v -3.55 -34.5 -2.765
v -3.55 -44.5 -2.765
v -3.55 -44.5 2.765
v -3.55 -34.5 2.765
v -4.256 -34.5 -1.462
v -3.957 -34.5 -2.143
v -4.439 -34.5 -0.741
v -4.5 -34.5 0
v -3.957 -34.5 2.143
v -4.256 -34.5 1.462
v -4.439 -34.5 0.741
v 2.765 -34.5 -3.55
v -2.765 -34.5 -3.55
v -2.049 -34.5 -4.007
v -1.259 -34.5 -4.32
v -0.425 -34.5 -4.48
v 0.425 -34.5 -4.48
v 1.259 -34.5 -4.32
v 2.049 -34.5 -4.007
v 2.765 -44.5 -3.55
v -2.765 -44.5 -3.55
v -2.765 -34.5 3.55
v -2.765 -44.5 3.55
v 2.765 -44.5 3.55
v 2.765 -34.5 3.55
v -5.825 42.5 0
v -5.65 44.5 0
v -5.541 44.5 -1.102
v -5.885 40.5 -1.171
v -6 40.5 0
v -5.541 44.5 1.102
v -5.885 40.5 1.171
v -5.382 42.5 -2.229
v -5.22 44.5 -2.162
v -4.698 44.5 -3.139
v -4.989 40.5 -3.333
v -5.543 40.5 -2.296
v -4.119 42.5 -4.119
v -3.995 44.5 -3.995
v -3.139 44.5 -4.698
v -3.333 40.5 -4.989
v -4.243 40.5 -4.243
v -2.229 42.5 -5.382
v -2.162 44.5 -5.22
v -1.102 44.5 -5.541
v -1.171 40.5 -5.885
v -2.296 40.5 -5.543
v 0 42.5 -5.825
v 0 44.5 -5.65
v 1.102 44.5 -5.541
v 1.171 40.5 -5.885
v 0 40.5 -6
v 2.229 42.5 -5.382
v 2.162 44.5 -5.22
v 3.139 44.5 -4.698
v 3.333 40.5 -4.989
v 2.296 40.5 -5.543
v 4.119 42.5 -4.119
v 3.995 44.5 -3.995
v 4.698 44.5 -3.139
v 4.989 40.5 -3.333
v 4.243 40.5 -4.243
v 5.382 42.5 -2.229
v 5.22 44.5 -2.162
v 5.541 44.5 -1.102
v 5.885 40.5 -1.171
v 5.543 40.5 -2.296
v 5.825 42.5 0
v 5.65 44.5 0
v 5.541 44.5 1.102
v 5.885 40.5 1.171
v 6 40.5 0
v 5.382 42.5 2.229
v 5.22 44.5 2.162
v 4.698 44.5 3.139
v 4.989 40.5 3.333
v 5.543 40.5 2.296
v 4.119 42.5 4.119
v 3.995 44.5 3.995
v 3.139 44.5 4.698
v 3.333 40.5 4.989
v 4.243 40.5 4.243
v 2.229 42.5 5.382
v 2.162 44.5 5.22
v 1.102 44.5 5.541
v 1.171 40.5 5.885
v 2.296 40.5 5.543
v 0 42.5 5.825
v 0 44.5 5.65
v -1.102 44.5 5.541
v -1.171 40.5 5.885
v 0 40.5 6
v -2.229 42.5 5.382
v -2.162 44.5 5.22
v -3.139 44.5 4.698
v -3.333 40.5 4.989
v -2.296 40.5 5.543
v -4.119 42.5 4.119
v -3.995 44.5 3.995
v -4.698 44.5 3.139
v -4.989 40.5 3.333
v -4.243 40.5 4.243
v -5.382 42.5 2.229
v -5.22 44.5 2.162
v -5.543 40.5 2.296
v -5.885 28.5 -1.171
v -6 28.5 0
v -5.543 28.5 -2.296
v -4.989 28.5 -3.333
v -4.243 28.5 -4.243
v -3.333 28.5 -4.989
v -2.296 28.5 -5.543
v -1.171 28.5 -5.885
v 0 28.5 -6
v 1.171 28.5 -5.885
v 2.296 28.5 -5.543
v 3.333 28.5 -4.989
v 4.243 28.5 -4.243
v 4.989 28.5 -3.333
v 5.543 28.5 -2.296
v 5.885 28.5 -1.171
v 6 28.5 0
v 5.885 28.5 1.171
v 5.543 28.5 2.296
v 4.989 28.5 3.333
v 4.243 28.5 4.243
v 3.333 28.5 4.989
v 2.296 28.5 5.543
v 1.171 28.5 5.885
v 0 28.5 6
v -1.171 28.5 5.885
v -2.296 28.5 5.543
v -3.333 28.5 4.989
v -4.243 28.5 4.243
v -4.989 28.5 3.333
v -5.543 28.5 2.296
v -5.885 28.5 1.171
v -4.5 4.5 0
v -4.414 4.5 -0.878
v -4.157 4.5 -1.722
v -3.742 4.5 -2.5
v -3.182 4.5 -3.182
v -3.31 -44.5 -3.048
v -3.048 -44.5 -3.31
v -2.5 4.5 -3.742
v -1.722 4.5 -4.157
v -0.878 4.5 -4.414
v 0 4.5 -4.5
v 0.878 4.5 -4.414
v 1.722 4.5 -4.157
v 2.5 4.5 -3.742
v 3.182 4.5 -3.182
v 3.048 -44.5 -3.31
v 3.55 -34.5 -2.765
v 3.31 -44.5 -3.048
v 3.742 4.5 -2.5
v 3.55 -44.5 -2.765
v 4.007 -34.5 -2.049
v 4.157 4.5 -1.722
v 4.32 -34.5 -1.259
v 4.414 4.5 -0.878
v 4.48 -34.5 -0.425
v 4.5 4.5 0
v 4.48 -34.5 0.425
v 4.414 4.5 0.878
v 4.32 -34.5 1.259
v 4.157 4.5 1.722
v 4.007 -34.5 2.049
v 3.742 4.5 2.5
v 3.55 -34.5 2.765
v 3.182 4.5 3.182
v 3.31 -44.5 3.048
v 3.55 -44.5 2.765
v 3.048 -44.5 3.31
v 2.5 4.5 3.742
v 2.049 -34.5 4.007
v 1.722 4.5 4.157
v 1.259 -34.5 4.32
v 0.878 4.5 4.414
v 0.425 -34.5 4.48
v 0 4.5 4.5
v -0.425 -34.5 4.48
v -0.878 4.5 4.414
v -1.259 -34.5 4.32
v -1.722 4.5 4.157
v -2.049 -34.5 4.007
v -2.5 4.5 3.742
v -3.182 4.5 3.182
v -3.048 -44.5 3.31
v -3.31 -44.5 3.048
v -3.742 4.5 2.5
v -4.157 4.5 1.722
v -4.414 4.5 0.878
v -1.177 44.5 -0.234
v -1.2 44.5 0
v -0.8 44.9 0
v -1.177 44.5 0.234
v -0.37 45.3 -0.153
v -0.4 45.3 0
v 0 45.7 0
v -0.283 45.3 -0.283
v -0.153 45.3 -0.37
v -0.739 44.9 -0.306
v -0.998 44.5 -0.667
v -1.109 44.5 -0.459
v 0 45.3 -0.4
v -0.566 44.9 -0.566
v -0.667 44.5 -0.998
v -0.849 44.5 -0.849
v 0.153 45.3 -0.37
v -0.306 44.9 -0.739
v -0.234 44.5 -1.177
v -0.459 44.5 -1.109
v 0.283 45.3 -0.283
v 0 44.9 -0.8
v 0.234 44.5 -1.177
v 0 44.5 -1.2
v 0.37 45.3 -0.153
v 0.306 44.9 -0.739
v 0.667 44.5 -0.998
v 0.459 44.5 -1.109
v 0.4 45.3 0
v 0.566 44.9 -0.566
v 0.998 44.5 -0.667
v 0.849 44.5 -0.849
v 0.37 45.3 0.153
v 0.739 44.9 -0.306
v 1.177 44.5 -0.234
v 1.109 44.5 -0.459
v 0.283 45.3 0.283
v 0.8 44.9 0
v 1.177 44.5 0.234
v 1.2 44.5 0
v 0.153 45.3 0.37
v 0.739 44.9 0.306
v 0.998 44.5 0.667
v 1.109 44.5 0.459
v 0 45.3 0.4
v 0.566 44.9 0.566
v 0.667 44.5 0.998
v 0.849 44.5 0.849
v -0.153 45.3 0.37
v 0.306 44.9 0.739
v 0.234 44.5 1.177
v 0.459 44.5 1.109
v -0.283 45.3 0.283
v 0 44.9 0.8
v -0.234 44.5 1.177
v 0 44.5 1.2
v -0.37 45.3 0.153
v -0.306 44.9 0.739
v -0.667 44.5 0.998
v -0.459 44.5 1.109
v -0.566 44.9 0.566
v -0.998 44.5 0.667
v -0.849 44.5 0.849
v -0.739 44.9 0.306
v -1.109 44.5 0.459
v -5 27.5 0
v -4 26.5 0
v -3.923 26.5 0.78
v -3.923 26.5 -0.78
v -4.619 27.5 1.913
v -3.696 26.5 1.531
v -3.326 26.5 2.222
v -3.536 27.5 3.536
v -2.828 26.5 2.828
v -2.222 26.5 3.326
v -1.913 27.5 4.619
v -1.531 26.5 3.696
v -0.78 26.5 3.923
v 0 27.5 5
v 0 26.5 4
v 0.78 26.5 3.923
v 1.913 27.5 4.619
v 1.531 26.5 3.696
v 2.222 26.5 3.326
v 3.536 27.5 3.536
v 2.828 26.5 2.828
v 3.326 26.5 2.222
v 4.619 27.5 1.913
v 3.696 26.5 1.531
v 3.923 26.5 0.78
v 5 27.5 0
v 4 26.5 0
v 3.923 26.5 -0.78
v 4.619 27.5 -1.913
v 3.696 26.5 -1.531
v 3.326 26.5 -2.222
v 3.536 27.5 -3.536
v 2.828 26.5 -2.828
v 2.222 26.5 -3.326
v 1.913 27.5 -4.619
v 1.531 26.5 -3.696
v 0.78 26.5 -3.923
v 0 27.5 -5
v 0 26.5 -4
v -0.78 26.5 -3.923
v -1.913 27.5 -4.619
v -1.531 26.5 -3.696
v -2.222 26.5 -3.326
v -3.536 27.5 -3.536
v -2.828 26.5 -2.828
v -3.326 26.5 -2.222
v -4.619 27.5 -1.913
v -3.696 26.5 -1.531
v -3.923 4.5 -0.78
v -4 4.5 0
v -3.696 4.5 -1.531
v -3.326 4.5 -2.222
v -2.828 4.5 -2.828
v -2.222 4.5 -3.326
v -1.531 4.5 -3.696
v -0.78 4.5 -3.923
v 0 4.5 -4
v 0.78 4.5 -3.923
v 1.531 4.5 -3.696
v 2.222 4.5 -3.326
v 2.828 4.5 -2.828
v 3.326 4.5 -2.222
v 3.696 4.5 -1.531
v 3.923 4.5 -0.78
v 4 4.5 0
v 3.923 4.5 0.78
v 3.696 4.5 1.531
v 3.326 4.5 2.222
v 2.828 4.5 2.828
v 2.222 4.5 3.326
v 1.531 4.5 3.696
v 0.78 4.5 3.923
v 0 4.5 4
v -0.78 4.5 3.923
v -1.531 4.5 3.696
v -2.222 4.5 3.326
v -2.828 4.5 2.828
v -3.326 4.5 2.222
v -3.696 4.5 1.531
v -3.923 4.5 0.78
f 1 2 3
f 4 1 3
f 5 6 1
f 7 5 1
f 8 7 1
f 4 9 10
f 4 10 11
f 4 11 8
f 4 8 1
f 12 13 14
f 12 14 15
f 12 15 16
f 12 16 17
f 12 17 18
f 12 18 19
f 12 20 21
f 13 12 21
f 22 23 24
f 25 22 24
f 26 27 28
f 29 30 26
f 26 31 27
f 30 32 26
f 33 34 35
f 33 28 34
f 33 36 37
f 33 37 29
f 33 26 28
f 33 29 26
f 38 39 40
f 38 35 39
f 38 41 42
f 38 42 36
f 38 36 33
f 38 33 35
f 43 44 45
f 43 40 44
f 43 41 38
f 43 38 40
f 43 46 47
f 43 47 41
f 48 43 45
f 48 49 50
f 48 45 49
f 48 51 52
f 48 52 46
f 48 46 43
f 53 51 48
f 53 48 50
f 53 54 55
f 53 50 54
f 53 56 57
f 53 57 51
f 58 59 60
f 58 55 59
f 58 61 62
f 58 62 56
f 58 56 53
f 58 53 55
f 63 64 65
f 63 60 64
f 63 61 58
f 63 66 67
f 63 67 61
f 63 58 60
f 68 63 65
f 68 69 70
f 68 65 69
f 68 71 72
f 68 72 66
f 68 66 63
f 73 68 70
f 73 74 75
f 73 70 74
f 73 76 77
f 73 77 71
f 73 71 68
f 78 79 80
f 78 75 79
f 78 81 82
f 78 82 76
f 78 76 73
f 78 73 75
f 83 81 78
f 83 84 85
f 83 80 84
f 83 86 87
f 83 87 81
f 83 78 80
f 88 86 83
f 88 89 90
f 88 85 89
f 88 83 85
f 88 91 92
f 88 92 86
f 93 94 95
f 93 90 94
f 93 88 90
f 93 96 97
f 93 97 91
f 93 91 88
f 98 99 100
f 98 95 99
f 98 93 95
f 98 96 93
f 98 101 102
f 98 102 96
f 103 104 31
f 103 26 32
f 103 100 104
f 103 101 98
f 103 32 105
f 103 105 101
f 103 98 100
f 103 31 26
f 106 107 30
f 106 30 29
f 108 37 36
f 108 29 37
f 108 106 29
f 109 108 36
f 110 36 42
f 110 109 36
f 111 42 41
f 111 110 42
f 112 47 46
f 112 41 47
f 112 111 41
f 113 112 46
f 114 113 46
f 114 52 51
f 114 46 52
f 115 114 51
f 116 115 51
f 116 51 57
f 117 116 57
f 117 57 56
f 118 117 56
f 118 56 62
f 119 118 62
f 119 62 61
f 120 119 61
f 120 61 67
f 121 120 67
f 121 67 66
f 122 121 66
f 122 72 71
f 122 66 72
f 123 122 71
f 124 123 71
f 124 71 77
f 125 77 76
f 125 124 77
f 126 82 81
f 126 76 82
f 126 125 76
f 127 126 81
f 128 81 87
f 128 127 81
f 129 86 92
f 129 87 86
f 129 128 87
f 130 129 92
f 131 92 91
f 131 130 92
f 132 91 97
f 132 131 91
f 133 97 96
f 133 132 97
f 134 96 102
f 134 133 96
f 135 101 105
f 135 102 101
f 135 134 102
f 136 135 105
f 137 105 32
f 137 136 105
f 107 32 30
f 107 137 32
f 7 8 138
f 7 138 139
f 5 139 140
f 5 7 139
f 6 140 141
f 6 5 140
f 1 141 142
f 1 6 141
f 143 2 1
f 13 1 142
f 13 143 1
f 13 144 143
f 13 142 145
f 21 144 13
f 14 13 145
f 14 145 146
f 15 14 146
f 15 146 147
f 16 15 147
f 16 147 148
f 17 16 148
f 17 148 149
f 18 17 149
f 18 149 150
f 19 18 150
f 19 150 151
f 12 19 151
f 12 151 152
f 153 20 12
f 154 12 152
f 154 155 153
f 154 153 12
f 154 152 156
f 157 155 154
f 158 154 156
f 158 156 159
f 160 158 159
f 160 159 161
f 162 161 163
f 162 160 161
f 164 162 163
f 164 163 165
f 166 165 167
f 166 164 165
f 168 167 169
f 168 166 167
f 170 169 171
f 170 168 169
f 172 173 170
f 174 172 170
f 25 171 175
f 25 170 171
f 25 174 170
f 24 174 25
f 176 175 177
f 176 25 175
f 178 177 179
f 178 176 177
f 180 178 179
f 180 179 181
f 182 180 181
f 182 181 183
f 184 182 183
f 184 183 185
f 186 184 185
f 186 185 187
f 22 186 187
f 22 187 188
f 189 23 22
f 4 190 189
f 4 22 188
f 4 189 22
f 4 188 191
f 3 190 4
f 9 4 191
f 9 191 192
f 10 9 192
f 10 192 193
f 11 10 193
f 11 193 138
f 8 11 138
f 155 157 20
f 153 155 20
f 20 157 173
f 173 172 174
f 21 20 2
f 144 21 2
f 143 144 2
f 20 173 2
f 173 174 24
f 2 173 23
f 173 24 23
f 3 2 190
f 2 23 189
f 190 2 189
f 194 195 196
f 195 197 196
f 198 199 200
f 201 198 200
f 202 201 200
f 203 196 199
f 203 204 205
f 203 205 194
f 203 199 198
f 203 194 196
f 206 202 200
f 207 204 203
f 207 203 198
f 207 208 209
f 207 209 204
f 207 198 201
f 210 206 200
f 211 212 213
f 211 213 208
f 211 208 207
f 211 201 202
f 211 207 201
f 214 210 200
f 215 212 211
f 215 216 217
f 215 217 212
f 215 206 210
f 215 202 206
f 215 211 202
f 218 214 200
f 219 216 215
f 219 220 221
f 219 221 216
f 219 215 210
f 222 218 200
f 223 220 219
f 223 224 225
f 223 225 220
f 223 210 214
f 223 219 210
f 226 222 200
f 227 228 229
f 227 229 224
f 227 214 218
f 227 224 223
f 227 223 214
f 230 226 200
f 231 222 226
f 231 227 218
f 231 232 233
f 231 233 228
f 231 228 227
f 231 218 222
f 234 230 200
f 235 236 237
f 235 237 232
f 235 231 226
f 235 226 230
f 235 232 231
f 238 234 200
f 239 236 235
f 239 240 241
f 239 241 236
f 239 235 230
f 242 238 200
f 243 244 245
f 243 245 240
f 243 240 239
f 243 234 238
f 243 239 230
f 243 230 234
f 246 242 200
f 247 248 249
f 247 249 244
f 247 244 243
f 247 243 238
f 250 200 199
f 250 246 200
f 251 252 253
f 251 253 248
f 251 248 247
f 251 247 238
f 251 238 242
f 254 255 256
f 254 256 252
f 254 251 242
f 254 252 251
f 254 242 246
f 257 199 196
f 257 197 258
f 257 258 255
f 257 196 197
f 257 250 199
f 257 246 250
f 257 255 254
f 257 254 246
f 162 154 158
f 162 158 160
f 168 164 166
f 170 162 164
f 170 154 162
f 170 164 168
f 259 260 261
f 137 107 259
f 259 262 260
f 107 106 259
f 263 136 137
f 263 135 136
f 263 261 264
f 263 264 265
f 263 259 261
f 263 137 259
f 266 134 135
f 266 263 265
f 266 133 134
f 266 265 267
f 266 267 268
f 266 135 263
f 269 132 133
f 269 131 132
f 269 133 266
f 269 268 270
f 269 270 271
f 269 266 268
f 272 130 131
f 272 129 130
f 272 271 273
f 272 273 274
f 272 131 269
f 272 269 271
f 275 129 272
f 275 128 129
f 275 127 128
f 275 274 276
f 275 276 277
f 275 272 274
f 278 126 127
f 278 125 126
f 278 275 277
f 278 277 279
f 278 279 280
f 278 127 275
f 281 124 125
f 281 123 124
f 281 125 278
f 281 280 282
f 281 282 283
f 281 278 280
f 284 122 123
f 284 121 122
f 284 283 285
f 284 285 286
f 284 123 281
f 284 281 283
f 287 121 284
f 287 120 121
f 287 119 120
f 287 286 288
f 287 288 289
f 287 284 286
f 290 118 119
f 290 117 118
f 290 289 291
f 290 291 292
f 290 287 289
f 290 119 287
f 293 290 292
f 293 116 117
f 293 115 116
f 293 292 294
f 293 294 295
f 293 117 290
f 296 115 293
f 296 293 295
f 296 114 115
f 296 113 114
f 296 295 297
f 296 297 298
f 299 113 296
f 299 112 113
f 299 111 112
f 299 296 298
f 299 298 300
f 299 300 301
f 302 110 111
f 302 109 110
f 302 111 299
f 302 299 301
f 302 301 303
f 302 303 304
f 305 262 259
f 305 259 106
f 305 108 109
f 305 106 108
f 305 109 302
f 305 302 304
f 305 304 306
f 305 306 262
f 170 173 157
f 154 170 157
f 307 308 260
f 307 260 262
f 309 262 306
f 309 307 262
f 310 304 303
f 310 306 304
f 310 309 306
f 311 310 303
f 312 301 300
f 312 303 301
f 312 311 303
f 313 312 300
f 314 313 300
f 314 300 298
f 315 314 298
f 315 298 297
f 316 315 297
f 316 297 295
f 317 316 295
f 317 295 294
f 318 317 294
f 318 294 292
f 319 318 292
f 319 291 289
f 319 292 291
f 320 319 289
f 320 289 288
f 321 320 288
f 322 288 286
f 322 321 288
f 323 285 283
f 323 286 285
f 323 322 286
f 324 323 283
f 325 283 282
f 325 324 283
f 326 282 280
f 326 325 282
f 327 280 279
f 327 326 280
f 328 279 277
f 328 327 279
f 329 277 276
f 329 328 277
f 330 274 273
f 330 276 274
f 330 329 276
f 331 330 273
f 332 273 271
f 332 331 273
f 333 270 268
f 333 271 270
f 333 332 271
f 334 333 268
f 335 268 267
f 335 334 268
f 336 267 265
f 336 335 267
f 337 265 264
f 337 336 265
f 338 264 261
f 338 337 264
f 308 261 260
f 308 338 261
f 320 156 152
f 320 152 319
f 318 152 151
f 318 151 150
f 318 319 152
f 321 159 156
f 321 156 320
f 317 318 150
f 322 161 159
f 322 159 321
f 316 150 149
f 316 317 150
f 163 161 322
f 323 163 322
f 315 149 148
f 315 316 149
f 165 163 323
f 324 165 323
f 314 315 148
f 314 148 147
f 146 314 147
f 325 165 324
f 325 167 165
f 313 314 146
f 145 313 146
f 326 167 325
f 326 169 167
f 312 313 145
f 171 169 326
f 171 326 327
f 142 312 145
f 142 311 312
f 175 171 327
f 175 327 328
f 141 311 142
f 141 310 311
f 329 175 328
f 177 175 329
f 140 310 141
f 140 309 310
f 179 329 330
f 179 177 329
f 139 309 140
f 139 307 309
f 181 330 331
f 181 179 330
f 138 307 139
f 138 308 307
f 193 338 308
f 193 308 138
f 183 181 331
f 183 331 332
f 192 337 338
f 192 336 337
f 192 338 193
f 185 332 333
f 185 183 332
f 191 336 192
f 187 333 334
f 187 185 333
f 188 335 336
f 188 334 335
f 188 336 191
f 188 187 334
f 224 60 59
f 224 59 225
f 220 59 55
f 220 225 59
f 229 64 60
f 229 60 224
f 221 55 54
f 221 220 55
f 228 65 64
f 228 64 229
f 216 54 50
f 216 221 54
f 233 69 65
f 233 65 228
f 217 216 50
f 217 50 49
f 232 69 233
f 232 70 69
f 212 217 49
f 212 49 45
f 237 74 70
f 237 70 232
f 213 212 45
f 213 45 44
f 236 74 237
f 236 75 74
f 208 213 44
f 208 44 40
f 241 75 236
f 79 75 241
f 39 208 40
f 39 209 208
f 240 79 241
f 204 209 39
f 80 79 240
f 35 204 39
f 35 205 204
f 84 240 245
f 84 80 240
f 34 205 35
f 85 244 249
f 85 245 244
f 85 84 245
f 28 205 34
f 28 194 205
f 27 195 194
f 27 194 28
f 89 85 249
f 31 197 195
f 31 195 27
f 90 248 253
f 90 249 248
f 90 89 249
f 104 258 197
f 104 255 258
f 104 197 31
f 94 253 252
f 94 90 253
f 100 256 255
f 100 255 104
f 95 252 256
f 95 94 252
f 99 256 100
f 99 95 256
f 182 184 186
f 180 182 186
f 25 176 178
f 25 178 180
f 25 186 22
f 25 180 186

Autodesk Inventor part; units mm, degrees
ref_plane "YZ Plane" through (0, 0, 0) normal (1, 0, 0) x (0, 1, 0)
ref_plane "XZ Plane" through (0, 0, 0) normal (0, 1, 0) x (-1, 0, 0)
ref_plane "XY Plane" through (0, 0, 0) normal (0, 0, 1) x (1, 0, 0)
sketch "Sketch1" plane through (0, 0, 0) normal (0, 0, 1) x (1, 0, 0)
  line L0 (-7.2, 0) -> (1.2, 0) construction
  line L1 (0, -62.54) -> (0, 63.74) projected
  line L2 (0, 45.7) -> (-1.2, 44.5)
  line L3 (-1.2, 44.5) -> (-5.65, 44.5)
  line L4 (-5.65, 44.5) -> (-6, 40.5)
  line L5 (-6, 40.5) -> (-6, 28.5)
  line L6 (-4, 26.5) -> (-4, 4.5)
  line L7 (-4, 4.5) -> (-4.5, 4.5)
  line L8 (-4.5, 4.5) -> (-4.5, -44.5)
  line L9 (-4.5, -44.5) -> (0, -44.5)
  line L10 (-6, 28.5) -> (-4, 26.5)
  point P0 (0, 0)
  dimension "tdz" = 12
  dimension "d1" = 45
  dimension "d2" = 5
  dimension "thl" = 16
  dimension "lu" = 40
  dimension "oal" = 89
  dimension "d6" = 1.2
  dimension "d7" = 4
  dimension "dconms" = 9
  dimension "d9" = 8
  dimension "d11" = 45
revolve "Revolution1" add sketch "Sketch1" angle 360 about axis through (0, -10, 0) along (0, 1, 0)
sketch "Sketch2" plane through (0, -44.5, 0) normal (0, -1, 0) x (1, 0, 0)
  circle A0 centre (0, 0) radius 4.5 construction
  line L0 (3.55, 3.55) -> (3.55, -3.55)
  line L1 (3.55, -3.55) -> (-3.55, -3.55)
  line L2 (-3.55, -3.55) -> (-3.55, 3.55)
  line L3 (-3.55, 3.55) -> (3.55, 3.55)
  circle A1 centre (0, 0) radius 6 projected
  dimension "d12" = 7.1
extrude "Extrusion1" cut sketch "Sketch2" against normal blind 10
equation "\"d6\" = 0.1 * tdz"
equation "\"d7\" = 0.25 * thl"
properties part number "Tap"
